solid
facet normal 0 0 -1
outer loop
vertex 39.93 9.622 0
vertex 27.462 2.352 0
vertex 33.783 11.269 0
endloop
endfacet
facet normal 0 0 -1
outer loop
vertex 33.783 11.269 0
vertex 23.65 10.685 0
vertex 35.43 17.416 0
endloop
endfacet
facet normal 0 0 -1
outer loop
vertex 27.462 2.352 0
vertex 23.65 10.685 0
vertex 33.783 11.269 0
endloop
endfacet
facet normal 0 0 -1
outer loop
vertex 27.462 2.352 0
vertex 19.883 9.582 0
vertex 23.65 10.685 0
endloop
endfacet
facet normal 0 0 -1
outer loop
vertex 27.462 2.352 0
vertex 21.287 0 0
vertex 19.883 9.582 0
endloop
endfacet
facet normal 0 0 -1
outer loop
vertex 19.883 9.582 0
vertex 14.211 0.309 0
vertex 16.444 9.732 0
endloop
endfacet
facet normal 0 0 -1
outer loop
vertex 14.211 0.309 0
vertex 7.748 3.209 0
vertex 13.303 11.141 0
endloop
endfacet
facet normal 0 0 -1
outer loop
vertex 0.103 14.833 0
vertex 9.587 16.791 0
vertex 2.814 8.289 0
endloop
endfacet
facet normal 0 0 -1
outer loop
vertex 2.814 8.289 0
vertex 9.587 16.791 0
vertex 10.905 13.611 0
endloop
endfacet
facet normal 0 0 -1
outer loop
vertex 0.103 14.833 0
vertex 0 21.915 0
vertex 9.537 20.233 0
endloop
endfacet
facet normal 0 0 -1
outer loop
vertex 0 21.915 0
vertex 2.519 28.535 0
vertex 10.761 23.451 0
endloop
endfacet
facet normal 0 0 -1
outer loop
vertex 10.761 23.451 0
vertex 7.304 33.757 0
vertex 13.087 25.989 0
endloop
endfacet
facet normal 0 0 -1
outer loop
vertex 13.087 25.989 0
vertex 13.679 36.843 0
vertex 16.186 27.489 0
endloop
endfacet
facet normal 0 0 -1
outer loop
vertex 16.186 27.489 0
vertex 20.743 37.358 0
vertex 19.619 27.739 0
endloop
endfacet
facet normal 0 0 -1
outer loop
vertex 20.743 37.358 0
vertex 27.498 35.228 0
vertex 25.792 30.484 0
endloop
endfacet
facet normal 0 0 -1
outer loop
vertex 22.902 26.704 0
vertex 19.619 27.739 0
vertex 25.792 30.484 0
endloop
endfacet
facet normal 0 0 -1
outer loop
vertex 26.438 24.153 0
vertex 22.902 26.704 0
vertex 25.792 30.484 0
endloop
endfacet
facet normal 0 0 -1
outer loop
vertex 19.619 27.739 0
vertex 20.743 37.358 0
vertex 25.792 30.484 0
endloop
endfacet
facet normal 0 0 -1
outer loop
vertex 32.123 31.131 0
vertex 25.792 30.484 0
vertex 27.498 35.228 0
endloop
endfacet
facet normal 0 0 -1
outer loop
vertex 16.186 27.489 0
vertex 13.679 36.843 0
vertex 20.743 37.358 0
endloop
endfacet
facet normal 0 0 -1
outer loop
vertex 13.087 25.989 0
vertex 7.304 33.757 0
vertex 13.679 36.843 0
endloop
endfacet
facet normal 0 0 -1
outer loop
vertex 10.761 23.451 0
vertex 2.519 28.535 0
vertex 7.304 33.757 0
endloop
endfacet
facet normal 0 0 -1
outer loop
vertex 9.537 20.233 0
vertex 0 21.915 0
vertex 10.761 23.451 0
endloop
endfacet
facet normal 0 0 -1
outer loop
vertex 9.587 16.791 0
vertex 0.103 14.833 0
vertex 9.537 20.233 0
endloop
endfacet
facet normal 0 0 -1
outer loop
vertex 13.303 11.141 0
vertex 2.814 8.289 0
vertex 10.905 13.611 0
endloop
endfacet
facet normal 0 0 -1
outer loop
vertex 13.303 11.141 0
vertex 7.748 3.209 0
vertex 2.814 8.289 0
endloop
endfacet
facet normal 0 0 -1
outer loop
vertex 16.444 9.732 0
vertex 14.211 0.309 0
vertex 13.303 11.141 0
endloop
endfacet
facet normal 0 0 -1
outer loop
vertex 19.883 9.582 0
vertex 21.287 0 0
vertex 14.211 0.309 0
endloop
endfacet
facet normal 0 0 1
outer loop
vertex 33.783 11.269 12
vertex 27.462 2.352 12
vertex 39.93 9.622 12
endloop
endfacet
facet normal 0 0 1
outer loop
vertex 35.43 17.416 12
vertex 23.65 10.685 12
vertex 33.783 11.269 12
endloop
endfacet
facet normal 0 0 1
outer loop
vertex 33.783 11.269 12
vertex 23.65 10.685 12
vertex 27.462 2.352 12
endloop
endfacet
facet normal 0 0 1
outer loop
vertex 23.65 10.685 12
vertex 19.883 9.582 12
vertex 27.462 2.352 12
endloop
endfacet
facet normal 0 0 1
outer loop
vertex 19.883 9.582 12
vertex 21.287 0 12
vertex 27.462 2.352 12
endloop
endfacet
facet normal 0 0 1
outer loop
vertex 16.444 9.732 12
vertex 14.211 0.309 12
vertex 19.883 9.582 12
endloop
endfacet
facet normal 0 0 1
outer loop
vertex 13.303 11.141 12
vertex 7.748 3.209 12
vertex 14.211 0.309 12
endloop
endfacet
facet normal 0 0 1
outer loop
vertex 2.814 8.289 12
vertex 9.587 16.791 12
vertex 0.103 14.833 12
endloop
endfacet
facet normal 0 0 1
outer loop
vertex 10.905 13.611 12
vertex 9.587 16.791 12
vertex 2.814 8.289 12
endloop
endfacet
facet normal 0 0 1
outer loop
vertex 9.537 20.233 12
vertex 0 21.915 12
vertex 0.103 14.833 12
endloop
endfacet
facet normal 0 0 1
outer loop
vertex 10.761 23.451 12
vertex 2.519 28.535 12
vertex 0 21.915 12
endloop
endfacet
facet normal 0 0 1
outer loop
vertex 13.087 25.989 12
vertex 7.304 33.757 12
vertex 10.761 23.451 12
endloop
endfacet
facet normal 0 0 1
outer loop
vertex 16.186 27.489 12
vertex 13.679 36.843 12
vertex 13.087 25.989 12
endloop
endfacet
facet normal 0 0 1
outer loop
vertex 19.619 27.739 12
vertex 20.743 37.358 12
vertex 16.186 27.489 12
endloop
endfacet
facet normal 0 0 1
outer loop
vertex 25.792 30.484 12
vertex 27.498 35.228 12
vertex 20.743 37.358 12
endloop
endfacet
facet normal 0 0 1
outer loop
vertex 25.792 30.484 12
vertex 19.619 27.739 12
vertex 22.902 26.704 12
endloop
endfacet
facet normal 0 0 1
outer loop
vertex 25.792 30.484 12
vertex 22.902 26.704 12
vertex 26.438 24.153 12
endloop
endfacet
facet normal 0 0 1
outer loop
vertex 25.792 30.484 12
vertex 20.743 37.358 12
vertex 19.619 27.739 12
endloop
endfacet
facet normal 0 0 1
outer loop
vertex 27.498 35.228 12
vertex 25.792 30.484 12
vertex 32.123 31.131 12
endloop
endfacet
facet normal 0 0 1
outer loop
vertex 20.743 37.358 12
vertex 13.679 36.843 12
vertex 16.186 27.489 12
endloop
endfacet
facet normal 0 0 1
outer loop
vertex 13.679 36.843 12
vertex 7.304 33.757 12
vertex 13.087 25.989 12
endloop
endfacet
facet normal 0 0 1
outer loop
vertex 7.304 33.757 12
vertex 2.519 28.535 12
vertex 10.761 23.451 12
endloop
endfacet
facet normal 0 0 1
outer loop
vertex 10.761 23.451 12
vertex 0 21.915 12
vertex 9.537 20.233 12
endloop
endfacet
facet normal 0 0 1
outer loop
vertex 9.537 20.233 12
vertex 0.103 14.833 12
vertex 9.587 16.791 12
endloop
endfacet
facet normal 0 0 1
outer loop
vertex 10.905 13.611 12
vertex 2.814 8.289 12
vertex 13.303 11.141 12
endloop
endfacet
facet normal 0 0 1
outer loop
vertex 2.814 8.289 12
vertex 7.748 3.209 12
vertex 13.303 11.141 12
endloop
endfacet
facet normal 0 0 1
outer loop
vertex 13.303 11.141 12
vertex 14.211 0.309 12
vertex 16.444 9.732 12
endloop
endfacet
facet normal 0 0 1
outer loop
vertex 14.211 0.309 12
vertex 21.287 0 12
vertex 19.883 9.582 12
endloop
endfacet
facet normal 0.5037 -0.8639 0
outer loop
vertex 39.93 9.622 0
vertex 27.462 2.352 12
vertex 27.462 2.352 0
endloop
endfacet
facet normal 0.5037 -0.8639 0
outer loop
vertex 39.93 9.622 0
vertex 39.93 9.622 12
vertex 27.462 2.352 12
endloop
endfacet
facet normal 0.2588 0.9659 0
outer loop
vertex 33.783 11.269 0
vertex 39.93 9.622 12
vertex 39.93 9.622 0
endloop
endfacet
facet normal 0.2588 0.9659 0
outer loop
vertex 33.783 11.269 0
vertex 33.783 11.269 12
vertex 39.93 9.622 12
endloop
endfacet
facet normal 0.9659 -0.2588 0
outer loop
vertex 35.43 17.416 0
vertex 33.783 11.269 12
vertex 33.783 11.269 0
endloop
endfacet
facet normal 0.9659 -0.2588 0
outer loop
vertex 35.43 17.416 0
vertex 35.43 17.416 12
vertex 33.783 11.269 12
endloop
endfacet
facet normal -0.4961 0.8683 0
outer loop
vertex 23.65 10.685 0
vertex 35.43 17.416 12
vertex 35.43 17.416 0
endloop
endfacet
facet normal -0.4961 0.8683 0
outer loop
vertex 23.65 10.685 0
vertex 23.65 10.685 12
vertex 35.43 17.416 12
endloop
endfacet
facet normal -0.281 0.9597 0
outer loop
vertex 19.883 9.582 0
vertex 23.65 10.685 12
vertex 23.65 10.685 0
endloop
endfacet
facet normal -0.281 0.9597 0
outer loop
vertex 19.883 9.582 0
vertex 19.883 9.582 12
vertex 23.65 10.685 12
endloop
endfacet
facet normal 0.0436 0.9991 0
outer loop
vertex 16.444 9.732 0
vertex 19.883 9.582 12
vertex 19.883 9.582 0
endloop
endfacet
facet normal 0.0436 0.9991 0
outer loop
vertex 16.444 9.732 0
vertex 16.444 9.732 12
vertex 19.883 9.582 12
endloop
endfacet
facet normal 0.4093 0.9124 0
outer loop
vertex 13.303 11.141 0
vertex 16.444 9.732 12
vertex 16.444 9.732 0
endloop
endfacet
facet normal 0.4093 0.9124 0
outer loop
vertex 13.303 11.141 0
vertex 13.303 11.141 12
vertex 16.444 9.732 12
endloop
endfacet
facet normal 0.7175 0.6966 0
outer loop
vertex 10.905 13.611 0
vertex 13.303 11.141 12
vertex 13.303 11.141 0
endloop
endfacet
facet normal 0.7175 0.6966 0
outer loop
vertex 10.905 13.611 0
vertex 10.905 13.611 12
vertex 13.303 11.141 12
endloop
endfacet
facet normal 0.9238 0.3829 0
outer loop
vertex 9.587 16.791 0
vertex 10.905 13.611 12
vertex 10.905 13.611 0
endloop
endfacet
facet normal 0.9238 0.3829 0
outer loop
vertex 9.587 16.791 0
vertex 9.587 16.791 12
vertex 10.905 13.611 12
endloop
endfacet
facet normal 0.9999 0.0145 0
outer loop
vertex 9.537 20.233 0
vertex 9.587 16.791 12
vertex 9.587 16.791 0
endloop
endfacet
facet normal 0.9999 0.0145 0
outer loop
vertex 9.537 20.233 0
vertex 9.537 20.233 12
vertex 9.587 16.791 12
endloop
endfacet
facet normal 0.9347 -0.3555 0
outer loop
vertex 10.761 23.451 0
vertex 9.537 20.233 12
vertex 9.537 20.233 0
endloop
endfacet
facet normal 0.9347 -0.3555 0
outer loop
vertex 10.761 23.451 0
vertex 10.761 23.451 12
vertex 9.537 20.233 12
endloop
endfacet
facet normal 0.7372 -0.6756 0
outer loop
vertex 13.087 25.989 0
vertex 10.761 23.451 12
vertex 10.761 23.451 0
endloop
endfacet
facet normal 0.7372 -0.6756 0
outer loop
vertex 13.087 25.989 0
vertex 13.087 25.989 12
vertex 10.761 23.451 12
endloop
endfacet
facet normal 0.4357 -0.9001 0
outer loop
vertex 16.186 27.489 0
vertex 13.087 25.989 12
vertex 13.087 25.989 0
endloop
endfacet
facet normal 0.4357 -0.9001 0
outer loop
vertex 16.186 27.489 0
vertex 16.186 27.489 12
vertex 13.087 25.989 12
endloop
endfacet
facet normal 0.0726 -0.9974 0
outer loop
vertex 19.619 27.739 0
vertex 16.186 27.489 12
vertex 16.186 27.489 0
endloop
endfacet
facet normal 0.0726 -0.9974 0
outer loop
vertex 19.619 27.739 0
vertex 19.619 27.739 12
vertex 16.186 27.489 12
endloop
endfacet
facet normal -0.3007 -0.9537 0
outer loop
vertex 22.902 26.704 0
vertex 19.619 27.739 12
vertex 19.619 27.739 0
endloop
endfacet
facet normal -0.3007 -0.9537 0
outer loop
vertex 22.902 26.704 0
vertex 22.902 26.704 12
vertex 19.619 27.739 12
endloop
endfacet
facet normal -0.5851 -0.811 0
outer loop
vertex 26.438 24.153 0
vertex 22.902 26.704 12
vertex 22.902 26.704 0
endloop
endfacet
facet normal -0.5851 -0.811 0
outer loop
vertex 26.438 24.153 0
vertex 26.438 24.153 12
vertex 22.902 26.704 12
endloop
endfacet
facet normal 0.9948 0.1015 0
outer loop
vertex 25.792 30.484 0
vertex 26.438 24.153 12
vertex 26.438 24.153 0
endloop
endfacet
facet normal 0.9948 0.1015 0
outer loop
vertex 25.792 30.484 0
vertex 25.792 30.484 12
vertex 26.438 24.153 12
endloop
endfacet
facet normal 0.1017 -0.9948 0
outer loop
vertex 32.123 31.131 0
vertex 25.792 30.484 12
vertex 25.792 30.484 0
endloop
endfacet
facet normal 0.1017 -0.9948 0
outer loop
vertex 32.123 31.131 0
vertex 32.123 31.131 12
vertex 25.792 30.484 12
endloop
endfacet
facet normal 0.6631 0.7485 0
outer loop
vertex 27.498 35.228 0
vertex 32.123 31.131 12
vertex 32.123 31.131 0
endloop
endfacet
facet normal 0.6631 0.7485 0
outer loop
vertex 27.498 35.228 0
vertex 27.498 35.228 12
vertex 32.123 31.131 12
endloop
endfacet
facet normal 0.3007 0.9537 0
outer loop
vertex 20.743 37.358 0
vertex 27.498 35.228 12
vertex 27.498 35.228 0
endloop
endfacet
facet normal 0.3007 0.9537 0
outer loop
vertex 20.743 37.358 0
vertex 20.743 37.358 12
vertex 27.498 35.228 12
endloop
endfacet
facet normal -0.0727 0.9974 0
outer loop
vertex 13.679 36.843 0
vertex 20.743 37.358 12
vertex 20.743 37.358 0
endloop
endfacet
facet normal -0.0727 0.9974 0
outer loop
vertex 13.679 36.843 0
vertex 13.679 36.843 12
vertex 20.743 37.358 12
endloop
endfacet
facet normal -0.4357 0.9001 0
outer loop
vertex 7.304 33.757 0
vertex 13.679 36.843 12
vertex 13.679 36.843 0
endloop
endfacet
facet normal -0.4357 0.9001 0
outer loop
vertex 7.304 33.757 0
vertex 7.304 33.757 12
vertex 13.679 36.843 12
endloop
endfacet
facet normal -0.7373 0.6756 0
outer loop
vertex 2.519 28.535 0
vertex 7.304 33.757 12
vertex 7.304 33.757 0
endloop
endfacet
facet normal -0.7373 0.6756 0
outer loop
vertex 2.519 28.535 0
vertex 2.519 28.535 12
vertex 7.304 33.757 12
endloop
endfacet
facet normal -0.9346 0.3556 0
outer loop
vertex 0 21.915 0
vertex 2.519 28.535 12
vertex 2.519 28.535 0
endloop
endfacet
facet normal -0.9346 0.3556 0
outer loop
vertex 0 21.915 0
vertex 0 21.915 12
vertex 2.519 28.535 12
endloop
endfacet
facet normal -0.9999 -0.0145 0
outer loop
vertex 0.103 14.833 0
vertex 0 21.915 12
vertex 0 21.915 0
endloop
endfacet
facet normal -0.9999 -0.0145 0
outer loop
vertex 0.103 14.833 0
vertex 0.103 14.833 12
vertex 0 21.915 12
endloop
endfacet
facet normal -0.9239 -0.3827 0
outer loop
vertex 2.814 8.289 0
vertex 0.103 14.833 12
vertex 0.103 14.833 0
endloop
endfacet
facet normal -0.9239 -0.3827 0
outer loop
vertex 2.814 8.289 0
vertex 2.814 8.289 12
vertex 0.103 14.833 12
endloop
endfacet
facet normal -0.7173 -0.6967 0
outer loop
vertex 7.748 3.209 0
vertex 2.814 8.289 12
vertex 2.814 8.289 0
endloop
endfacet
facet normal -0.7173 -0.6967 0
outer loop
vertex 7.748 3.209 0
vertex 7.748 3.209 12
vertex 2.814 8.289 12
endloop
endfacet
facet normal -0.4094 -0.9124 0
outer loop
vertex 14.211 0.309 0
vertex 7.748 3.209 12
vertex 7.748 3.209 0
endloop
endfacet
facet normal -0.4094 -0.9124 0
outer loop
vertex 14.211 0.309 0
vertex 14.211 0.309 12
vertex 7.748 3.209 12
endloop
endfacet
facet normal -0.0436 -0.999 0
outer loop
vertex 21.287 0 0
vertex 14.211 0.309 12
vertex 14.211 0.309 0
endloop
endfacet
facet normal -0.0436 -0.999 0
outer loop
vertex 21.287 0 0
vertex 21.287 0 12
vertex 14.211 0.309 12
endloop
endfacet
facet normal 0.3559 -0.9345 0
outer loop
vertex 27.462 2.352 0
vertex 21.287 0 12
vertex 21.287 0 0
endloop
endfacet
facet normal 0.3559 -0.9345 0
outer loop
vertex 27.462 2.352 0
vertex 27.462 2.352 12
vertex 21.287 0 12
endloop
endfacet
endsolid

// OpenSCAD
$fn = 32;

// ----------------------------------------------------------------------
// Eye lug: ring_tail, 12 mm thick
// ----------------------------------------------------------------------

// --- parameters (mm) ---
profile_height = 12;      // extrusion height
profile_points = 30;      // points of the closed outline

profile = [[25.792, 30.484], [32.123, 31.131], [27.498, 35.228], [20.743, 37.358], [13.679, 36.843], [7.304, 33.757], [2.519, 28.535], [0, 21.915], [0.103, 14.833], [2.814, 8.289], [7.748, 3.209], [14.211, 0.309], [21.287, 0], [27.462, 2.352], [39.93, 9.622], [33.783, 11.269], [35.43, 17.416], [23.65, 10.685], [19.883, 9.582], [16.444, 9.732], [13.303, 11.141], [10.905, 13.611], [9.587, 16.791], [9.537, 20.233], [10.761, 23.451], [13.087, 25.989], [16.186, 27.489], [19.619, 27.739], [22.902, 26.704], [26.438, 24.153]];  // single closed polygon, 30 points, counter clockwise

// --- the one profile operation ---
linear_extrude(height = profile_height) polygon(points = profile);
